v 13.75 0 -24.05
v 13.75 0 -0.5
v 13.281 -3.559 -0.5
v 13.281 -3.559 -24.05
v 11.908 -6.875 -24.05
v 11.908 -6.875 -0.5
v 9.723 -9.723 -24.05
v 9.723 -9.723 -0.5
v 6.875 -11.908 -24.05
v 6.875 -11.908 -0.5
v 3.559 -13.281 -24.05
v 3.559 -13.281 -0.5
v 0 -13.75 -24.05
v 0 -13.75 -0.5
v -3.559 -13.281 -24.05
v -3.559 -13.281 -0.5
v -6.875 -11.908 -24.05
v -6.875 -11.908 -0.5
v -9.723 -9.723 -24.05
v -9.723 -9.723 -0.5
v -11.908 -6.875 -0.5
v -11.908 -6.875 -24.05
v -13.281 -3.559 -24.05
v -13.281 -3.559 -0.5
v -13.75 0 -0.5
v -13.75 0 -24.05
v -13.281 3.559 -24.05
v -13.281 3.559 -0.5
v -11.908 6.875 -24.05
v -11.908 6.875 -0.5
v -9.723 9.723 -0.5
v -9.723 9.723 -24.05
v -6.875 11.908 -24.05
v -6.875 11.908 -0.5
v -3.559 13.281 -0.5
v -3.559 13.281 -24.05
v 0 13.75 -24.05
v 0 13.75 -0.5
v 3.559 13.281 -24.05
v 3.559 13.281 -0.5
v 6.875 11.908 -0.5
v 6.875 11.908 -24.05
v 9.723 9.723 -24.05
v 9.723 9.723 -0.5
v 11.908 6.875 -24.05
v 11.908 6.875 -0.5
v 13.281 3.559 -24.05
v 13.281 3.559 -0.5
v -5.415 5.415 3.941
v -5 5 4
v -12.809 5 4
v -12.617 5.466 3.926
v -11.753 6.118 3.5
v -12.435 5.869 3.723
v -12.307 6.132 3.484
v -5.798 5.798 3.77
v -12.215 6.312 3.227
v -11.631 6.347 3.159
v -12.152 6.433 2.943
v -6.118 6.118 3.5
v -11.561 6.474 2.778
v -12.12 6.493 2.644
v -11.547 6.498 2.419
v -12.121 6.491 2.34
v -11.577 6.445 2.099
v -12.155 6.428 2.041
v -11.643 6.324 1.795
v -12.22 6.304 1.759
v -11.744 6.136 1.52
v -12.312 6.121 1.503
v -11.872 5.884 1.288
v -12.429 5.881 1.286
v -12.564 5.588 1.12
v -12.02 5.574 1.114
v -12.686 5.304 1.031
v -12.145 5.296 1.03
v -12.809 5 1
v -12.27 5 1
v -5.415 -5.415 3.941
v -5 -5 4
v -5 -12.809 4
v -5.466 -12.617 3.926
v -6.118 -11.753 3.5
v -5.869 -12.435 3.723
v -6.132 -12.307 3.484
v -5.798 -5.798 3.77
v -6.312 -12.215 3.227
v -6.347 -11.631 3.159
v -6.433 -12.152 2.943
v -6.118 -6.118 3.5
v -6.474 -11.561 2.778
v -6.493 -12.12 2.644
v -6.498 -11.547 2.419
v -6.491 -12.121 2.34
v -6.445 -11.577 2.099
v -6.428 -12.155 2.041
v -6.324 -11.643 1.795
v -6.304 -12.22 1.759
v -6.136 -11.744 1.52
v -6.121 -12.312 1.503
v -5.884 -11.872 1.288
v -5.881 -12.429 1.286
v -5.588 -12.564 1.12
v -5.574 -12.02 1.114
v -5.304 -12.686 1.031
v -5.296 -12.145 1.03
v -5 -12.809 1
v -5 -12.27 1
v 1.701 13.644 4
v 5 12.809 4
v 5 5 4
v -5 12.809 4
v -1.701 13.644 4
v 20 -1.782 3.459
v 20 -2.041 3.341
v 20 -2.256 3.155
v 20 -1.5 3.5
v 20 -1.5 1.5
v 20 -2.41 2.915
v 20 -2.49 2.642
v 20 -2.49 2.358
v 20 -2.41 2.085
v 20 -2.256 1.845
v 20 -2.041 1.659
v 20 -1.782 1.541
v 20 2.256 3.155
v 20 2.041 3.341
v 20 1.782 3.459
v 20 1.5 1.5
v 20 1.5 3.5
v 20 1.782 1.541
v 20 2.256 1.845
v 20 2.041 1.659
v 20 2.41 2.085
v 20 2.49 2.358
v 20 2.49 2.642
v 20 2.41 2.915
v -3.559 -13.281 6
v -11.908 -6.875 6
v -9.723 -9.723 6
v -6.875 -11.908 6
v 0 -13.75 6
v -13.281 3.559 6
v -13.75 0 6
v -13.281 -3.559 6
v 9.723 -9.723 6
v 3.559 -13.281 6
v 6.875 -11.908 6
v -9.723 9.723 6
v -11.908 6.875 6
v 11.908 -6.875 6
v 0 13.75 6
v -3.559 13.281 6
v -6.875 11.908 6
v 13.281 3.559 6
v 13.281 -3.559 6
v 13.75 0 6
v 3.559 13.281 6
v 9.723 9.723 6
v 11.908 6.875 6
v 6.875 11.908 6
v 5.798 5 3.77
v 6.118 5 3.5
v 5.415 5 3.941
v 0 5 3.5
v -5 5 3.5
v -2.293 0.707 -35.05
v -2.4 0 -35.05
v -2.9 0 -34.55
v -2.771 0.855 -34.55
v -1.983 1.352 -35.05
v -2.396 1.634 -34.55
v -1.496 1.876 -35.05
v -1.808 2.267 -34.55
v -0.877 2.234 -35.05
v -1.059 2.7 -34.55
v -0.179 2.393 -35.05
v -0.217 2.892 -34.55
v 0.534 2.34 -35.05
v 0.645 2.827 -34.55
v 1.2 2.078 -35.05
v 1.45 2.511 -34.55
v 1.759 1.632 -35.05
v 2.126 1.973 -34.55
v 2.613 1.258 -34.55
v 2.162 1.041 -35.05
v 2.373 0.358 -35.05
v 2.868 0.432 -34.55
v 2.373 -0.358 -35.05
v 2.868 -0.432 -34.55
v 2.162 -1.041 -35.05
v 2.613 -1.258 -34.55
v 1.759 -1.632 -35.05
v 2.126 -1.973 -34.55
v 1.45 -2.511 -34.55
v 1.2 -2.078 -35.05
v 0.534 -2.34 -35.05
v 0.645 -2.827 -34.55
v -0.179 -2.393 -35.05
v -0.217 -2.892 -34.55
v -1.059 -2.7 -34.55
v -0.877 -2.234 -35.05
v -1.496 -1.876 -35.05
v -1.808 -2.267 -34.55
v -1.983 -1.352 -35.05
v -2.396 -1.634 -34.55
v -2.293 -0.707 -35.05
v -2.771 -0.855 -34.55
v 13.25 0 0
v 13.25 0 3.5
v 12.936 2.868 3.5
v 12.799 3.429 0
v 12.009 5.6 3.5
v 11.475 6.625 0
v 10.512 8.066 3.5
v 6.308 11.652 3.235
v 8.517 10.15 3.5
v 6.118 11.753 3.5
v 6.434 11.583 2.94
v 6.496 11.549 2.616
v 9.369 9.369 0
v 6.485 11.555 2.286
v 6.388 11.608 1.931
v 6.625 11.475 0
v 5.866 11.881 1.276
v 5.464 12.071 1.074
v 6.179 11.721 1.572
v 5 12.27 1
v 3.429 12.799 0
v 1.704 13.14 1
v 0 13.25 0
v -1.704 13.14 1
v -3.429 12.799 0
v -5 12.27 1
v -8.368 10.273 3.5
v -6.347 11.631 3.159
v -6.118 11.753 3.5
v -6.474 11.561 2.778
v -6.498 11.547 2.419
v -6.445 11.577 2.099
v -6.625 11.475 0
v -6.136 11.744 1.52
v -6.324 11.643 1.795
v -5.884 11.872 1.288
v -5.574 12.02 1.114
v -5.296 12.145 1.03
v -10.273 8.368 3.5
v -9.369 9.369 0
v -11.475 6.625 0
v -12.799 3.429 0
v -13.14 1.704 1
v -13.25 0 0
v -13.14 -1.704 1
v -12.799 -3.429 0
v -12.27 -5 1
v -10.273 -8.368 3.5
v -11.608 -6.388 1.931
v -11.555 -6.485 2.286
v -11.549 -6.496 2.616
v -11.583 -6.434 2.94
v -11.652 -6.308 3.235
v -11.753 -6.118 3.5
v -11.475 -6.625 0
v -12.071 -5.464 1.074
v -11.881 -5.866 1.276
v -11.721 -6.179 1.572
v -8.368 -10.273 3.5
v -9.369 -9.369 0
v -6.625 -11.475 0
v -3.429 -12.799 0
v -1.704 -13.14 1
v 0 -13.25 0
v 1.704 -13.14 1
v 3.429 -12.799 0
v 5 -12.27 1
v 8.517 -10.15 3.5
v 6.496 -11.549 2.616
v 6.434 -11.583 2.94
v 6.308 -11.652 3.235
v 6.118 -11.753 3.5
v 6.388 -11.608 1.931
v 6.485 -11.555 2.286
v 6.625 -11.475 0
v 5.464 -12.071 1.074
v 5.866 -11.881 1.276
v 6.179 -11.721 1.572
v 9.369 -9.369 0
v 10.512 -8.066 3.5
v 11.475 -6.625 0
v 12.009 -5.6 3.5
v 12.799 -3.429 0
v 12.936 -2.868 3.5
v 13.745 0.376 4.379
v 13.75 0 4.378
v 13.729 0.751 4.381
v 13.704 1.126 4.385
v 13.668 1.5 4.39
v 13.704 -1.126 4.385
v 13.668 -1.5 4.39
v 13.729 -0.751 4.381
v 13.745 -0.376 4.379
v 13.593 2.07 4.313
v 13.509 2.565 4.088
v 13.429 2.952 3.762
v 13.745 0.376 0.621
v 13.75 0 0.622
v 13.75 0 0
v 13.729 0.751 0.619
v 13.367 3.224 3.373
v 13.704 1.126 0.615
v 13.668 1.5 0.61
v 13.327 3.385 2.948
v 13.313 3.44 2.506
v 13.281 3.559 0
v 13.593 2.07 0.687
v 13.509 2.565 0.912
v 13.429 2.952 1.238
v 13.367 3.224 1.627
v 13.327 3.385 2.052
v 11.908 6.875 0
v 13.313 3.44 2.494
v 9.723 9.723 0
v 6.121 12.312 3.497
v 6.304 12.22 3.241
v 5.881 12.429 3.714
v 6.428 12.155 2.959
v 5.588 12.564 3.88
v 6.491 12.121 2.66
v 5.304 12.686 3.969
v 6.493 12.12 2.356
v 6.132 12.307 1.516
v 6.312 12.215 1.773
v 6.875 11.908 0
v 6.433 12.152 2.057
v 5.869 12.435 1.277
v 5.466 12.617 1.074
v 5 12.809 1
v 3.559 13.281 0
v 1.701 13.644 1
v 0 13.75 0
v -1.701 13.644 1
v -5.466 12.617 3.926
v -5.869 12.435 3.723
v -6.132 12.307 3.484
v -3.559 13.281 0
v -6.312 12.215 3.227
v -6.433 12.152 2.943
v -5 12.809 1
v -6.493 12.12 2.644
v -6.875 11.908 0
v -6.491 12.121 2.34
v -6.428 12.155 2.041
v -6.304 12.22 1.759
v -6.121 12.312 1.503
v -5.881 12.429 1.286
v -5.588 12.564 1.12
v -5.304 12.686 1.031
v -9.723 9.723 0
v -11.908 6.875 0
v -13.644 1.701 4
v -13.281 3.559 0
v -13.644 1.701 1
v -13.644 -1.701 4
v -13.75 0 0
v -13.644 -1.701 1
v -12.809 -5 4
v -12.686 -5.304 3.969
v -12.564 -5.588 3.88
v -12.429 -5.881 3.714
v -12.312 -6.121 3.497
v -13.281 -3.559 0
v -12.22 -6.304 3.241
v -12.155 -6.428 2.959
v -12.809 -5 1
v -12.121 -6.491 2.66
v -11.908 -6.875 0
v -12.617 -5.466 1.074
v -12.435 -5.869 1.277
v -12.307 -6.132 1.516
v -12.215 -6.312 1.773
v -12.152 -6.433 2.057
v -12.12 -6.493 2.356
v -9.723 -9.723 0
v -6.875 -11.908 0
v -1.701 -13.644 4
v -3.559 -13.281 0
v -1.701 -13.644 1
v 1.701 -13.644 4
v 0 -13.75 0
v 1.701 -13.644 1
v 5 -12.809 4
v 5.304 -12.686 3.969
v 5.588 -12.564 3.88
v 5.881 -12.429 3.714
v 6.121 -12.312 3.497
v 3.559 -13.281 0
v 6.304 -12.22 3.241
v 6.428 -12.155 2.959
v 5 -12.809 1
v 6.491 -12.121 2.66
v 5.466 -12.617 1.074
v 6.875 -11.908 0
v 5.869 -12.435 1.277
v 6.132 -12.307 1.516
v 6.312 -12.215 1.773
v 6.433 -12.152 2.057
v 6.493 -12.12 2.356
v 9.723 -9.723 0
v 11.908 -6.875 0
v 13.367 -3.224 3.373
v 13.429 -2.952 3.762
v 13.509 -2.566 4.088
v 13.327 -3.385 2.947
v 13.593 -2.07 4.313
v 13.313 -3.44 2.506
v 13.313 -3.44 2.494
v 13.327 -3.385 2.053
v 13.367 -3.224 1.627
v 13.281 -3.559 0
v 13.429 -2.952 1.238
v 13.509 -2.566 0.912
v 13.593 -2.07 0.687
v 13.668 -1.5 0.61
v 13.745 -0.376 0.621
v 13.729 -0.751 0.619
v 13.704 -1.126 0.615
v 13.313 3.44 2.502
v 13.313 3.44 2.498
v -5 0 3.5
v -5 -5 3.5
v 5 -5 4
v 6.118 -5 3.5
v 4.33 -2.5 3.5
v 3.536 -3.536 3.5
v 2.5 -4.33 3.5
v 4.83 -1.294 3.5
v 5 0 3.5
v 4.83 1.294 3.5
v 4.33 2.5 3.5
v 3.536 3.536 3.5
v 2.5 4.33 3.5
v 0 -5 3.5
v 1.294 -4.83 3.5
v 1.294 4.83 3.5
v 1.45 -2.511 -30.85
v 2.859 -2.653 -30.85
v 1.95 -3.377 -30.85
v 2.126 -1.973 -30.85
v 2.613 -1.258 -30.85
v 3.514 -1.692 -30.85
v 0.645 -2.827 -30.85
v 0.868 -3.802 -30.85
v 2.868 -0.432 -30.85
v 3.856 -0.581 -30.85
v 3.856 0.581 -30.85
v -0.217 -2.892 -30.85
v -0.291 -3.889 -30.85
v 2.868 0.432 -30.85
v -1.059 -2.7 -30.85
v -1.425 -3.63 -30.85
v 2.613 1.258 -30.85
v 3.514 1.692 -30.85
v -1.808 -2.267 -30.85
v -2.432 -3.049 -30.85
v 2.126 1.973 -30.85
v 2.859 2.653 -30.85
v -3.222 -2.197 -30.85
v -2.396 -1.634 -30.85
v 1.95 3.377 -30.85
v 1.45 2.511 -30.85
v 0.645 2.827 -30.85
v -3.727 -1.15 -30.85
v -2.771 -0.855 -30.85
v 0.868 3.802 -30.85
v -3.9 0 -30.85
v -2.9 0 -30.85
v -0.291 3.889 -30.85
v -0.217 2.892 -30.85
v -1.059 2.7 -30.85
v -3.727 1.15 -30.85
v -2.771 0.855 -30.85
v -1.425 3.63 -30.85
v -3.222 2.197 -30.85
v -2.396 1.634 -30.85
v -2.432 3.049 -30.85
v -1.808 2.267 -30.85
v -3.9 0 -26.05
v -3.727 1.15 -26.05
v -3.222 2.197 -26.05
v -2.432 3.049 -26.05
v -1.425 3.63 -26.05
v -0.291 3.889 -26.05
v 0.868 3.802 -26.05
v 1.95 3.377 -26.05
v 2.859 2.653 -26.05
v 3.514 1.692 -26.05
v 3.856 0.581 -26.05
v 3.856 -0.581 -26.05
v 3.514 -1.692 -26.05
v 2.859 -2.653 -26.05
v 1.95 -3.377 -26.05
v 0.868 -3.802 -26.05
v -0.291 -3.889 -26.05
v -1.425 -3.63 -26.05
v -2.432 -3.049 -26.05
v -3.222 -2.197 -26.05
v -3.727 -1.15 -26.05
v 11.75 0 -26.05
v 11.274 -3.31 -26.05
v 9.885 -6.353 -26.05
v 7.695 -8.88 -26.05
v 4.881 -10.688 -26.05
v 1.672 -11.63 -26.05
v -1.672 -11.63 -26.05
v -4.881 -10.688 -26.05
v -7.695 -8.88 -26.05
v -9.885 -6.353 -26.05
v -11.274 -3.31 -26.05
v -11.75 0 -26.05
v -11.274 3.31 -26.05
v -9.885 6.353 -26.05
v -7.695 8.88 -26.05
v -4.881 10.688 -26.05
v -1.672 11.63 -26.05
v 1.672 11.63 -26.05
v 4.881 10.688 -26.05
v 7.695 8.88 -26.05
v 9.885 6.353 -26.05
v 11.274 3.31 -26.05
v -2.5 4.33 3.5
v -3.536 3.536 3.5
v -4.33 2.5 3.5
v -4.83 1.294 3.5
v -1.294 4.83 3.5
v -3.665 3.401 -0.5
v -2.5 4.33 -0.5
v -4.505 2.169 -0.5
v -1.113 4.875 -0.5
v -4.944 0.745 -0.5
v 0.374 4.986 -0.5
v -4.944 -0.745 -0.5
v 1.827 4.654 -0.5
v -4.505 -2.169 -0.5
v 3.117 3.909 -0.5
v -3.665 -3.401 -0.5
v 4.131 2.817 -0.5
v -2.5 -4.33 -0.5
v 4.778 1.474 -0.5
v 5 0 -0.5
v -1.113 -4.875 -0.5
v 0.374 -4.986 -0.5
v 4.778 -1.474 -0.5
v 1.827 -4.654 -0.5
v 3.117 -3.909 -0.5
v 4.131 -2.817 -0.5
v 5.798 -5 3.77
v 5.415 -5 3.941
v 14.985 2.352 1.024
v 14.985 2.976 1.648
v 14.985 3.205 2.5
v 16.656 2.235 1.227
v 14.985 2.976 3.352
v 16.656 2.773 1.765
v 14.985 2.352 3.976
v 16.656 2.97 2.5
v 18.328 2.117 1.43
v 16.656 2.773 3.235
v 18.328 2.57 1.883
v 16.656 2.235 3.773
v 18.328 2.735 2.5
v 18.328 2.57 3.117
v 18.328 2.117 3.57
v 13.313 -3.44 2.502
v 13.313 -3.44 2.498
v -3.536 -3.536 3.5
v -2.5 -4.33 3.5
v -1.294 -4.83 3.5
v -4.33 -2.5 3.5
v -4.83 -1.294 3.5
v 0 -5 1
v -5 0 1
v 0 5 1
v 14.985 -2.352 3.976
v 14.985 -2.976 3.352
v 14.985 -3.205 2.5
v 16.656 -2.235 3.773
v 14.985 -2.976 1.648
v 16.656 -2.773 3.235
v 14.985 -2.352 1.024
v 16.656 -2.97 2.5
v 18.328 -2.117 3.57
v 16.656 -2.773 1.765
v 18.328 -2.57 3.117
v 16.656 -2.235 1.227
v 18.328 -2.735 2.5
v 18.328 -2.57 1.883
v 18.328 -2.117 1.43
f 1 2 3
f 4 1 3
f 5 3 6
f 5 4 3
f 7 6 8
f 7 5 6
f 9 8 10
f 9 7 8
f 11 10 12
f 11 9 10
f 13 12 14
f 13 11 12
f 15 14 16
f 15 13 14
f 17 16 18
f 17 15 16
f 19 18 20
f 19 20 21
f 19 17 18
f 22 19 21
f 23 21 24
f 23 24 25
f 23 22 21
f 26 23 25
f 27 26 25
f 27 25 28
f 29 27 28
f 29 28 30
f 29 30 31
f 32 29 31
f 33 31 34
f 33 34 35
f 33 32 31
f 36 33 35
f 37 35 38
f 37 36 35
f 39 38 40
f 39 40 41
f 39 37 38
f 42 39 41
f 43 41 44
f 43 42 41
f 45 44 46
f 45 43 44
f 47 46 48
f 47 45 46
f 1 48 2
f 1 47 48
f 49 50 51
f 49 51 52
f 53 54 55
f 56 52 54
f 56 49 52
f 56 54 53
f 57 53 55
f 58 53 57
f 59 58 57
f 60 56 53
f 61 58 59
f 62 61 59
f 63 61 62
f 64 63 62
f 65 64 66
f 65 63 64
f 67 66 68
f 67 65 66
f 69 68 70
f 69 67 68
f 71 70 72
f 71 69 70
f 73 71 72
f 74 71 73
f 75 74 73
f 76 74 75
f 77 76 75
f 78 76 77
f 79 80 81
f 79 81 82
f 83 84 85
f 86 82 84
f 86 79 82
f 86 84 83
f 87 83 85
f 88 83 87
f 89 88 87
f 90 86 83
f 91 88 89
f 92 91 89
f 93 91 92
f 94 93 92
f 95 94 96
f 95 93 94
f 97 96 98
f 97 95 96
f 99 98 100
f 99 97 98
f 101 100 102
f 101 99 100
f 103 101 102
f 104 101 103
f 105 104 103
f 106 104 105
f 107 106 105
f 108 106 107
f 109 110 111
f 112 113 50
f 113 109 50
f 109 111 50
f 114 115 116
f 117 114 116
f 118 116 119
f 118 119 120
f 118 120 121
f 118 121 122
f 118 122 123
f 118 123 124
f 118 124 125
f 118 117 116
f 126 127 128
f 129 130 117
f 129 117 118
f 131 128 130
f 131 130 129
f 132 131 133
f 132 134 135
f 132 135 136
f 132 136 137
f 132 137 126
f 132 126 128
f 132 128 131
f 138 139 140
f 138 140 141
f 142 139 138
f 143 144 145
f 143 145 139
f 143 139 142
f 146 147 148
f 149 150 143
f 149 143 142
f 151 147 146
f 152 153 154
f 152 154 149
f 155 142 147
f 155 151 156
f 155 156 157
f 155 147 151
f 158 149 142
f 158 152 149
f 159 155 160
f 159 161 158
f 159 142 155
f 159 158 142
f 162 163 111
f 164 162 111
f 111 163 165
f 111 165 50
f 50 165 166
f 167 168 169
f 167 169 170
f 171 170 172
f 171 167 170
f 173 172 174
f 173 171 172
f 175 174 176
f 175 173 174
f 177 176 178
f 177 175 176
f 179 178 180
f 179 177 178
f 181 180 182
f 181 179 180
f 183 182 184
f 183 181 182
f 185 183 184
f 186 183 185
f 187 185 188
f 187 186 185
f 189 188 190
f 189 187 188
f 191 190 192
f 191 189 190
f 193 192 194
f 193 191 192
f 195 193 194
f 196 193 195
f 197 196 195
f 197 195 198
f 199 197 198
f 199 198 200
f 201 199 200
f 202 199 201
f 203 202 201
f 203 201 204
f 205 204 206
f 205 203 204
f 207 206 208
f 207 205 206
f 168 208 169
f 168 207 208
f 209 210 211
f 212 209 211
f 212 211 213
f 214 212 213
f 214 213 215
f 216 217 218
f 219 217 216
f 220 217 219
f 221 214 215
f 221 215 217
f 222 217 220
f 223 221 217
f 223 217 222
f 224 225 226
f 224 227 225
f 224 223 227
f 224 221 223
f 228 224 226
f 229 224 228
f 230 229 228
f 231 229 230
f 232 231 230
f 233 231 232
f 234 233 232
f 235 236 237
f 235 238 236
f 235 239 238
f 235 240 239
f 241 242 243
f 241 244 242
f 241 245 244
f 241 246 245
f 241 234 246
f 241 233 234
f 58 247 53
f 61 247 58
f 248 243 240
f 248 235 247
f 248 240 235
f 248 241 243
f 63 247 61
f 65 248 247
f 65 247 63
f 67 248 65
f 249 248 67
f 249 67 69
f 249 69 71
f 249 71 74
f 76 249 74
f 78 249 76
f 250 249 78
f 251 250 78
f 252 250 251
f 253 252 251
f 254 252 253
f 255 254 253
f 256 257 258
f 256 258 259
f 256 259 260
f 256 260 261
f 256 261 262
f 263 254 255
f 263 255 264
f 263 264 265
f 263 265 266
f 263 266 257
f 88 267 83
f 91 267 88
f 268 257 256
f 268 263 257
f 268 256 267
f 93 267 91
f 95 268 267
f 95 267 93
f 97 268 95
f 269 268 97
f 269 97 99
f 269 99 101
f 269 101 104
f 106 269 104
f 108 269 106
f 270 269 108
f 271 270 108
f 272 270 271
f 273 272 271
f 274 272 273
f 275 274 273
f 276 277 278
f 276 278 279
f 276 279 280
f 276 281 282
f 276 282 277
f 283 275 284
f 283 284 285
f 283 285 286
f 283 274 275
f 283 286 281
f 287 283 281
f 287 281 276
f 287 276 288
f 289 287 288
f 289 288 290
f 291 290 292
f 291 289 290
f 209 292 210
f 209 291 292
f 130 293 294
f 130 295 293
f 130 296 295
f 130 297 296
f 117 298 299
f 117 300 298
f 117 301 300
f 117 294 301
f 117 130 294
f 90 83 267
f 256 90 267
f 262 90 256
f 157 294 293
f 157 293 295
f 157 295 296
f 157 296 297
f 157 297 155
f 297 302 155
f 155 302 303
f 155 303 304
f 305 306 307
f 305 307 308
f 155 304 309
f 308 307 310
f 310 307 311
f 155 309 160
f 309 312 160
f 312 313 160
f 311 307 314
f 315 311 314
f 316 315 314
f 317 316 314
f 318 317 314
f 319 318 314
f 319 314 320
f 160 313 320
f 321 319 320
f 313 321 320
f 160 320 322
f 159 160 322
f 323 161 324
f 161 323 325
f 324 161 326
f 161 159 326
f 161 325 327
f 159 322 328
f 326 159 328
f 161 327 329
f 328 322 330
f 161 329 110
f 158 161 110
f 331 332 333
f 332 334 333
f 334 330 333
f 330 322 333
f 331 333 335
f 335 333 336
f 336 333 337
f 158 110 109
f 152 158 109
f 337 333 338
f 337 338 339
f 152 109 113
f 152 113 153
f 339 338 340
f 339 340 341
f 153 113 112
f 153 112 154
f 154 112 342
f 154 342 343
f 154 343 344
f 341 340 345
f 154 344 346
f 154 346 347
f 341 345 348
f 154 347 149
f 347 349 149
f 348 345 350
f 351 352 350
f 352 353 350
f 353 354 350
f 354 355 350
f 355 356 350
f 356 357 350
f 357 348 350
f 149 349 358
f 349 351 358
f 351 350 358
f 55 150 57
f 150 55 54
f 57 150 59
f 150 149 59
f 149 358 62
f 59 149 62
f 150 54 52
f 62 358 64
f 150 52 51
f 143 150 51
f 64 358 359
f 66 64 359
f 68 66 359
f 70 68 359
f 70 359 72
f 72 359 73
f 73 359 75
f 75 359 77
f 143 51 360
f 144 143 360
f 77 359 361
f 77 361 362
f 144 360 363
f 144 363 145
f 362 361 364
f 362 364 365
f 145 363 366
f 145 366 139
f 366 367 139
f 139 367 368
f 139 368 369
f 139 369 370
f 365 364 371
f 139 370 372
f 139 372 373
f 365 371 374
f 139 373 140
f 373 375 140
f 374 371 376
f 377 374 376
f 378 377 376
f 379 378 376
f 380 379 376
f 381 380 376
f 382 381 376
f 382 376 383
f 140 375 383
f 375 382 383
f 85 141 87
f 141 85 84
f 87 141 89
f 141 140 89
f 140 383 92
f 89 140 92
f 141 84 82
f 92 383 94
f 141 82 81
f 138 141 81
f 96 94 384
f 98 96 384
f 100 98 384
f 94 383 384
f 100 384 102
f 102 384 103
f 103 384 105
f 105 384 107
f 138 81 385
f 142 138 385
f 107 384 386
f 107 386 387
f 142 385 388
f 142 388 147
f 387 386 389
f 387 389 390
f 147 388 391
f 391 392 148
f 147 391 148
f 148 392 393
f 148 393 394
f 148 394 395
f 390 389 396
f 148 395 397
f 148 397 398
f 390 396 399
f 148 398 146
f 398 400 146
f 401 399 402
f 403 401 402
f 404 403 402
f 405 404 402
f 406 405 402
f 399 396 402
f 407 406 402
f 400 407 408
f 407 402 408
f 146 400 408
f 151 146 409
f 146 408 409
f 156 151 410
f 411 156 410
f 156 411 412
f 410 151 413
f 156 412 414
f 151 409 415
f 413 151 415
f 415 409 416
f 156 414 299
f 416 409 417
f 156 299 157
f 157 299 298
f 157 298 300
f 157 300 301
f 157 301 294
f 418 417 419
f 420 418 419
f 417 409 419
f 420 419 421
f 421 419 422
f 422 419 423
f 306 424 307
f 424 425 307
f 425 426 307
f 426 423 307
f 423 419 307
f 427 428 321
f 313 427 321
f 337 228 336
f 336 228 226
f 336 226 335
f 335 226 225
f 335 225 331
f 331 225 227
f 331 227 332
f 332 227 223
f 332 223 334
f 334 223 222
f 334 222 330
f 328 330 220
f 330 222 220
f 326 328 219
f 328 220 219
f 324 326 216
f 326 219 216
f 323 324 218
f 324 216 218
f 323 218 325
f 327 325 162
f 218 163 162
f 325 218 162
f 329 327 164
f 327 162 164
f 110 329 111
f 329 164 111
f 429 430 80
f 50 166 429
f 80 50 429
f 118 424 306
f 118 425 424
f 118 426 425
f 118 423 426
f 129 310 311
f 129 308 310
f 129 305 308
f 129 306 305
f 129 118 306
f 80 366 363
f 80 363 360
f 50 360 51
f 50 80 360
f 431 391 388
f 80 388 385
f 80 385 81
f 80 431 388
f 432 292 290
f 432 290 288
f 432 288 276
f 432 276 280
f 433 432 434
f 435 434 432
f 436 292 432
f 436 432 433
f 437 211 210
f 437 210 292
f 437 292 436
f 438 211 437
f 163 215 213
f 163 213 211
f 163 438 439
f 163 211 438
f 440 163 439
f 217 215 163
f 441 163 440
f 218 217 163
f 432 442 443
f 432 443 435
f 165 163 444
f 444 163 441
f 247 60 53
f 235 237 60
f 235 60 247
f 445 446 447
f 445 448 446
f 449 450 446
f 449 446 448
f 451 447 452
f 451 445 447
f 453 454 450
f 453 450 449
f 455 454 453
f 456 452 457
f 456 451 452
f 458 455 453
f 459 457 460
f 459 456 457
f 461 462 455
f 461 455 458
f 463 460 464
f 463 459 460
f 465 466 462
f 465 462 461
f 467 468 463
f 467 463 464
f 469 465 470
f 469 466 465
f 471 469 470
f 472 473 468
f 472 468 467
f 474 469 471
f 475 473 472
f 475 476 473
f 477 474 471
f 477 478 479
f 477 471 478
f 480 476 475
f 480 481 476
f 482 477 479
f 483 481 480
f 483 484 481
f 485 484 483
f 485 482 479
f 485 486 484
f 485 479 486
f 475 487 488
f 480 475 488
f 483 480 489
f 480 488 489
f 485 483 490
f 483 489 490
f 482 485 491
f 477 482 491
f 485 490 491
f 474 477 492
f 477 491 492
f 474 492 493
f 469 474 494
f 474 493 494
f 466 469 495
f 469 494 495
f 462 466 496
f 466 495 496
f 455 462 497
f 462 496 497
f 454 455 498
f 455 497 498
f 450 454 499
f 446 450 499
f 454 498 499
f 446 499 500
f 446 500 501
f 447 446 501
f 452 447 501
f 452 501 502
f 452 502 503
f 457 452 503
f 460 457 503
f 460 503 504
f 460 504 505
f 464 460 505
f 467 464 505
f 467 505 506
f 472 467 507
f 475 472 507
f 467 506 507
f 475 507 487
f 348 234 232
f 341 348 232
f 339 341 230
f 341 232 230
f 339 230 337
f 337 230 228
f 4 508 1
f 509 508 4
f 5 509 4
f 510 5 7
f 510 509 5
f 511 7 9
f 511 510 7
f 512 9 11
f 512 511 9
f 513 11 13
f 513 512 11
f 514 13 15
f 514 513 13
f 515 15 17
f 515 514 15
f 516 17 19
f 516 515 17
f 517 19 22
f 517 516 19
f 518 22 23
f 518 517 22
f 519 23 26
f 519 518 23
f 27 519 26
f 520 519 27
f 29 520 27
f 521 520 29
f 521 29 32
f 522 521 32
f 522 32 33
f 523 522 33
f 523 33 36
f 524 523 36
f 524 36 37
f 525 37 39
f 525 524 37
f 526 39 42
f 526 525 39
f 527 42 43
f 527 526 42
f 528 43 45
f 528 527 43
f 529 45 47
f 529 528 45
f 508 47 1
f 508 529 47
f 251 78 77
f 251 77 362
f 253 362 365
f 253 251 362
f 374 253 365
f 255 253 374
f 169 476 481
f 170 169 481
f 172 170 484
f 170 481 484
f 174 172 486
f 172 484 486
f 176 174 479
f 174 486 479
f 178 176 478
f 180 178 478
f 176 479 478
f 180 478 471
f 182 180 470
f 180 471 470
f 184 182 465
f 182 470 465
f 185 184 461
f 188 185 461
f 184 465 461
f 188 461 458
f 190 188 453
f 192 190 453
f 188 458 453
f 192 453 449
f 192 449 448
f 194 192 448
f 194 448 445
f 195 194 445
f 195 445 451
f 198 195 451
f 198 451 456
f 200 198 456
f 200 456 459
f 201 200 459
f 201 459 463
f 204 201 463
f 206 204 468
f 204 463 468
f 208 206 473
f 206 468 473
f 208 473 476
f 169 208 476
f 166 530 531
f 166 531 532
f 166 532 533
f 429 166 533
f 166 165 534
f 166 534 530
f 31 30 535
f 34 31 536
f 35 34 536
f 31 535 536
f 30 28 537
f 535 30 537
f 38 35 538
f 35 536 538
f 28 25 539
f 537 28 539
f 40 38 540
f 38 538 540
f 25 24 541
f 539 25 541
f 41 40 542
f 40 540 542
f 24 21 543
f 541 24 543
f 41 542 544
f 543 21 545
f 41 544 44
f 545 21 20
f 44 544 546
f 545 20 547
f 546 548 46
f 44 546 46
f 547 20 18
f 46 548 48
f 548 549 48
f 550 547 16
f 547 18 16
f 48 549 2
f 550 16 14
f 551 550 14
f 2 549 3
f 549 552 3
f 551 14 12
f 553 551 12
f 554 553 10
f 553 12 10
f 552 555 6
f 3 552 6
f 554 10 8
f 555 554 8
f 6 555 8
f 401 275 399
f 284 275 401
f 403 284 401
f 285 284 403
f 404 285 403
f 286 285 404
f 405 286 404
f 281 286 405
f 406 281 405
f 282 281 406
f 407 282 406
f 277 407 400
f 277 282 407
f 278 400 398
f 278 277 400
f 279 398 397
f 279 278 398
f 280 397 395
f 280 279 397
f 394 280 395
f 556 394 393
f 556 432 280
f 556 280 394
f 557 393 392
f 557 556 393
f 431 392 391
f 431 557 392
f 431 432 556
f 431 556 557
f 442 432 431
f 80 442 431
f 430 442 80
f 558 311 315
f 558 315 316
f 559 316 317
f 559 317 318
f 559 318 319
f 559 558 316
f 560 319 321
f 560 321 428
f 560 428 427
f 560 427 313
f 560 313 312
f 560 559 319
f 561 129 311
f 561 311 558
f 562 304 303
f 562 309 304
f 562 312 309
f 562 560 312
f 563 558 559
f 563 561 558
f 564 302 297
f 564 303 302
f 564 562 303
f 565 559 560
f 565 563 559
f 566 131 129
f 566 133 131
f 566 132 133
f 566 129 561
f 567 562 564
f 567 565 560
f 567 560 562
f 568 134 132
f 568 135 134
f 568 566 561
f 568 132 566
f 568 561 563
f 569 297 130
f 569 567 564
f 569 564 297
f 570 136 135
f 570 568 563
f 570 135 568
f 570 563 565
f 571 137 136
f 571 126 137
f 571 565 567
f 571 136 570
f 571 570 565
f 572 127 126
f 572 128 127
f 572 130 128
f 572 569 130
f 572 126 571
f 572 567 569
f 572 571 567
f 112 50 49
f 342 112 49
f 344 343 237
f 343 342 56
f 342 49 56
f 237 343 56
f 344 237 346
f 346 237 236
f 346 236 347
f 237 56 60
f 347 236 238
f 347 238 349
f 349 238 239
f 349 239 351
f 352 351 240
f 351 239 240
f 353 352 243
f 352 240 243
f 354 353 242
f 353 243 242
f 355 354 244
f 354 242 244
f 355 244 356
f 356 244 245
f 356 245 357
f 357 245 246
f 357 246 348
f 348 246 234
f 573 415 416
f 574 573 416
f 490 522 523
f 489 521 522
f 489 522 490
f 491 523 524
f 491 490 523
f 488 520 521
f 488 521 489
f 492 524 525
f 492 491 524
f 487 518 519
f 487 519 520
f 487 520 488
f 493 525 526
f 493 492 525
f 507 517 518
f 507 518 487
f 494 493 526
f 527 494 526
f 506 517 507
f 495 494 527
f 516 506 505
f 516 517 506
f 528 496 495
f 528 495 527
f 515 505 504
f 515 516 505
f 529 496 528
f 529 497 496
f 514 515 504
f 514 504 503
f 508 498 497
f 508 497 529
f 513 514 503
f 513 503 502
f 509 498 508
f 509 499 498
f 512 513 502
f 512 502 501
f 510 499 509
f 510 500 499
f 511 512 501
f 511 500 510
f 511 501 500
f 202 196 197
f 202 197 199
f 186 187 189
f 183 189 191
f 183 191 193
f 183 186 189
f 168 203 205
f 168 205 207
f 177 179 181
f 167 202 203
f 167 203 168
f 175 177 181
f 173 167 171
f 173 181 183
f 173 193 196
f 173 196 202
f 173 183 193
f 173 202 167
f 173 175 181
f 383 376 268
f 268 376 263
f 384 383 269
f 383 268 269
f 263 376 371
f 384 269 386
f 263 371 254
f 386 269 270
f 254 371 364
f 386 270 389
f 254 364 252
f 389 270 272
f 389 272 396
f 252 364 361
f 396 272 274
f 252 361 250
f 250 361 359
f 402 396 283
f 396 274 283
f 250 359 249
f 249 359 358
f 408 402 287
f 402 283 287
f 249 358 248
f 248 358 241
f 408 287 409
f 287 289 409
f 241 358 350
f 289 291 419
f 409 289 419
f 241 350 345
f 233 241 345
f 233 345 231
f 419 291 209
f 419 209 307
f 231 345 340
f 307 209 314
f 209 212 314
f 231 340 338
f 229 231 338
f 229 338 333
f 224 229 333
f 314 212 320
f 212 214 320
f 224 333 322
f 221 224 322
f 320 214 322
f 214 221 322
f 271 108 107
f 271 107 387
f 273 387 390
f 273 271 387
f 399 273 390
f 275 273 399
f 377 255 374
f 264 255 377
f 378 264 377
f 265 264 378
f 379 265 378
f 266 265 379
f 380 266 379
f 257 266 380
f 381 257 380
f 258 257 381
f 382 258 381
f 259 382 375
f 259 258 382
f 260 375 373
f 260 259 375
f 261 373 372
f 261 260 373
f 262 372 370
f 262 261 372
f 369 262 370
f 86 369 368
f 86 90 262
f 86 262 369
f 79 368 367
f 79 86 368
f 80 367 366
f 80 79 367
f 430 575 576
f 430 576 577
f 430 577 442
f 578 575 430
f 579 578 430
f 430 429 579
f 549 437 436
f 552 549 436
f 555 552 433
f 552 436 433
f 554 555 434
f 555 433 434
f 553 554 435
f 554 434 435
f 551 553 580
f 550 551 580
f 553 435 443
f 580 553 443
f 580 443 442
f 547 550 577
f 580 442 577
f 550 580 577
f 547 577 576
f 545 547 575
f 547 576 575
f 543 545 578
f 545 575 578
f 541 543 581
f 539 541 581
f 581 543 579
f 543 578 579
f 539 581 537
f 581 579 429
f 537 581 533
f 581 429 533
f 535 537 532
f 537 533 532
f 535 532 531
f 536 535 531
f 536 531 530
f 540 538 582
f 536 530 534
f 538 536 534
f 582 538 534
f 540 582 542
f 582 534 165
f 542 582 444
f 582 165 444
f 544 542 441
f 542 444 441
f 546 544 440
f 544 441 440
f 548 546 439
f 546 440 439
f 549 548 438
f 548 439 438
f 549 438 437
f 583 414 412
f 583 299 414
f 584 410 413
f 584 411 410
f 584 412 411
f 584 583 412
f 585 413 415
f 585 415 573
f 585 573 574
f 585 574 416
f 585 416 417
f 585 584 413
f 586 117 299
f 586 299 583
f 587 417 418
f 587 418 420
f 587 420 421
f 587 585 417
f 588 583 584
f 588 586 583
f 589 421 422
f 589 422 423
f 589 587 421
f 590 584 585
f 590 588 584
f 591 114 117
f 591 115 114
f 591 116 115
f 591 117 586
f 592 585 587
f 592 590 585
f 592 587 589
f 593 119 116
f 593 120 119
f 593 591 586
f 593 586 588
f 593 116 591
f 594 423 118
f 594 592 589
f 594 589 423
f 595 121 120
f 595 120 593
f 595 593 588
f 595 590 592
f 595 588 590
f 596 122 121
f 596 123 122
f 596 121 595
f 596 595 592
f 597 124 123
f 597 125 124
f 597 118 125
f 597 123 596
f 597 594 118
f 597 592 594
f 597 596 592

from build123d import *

# Parameters (mm, degrees)
SKETCH1_R           = 13.75
BOSS_EXTRUDE1_DEPTH = 6
SHELL1_T            = -0.5
SKETCH3_R           = 5
BOSS_EXTRUDE2_DEPTH = 6
BOSS_EXTRUDE7_START = 2
SKETCH10_R          = 13.25
BOSS_EXTRUDE7_DEPTH = 2
BOSS_EXTRUDE3_START = 25.55
SKETCH4_R           = 13.75
BOSS_EXTRUDE3_DEPTH = 25.55
CHAMFER1_SIZE       = 2
SKETCH5_R           = 3.9
BOSS_EXTRUDE4_DEPTH = 4.8
SKETCH6_R           = 2.9
BOSS_EXTRUDE5_DEPTH = 4.2
CHAMFER2_SIZE       = 0.5
CUT_EXTRUDE1_START  = -5
CUT_EXTRUDE1_DEPTH  = 24.2
CUT_EXTRUDE2_START  = -5
CUT_EXTRUDE2_DEPTH  = 24.2
BOSS_EXTRUDE8_DEPTH = 6.687218579
BOSS_EXTRUDE8_DRAFT = 8


# Read off the part's stored shape, not the designer's step: Boss-Extrude8
with BuildPart() as part:
    # Sketch1 → Boss-Extrude1 (new body)
    with BuildSketch(Plane.XY):
        Circle(SKETCH1_R)
    extrude(amount=BOSS_EXTRUDE1_DEPTH)

    # Shell1
    shell1_openings = [part.faces().sort_by_distance(p)[0] for p in [
        (0, 0, 0),
    ]]
    offset(amount=SHELL1_T, openings=shell1_openings, kind=Kind.INTERSECTION)

    # Sketch3 → Boss-Extrude2 (add)
    with BuildSketch(Plane(origin=(0, 0, 5.5), x_dir=(-1, 0, 0), z_dir=(0, 0, -1))):
        with Locations(Location((0, 0, 0), (0, 0, 180))):
            Circle(SKETCH3_R)
    extrude(amount=BOSS_EXTRUDE2_DEPTH)

    # Sketch10 → Boss-Extrude7 (add)
    with BuildSketch(Plane(origin=(0, 0, 5.5), x_dir=(-1, 0, 0), z_dir=(0, 0, -1)).offset(BOSS_EXTRUDE7_START)):
        Circle(SKETCH10_R)
    extrude(amount=-BOSS_EXTRUDE7_DEPTH)

    # Sketch4 → Boss-Extrude3 (add)
    with BuildSketch(Plane(origin=(0, 0, -0.5), x_dir=(-1, 0, 0), z_dir=(0, 0, -1)).offset(BOSS_EXTRUDE3_START)):
        with Locations(Location((0, 0, 0), (0, 0, 180))):
            Circle(SKETCH4_R)
    extrude(amount=-BOSS_EXTRUDE3_DEPTH)

    # Chamfer1
    chamfer1_edges = [part.edges().sort_by_distance(p)[0] for p in [
        (-13.75, 0, -26.05),
    ]]
    chamfer(chamfer1_edges, length=CHAMFER1_SIZE)

    # Sketch5 → Boss-Extrude4 (add)
    with BuildSketch(Plane(origin=(0, 0, -26.05), x_dir=(-1, 0, 0), z_dir=(0, 0, -1))):
        Circle(SKETCH5_R)
    extrude(amount=BOSS_EXTRUDE4_DEPTH)

    # Sketch6 → Boss-Extrude5 (add)
    with BuildSketch(Plane(origin=(0, 0, -30.85), x_dir=(-1, 0, 0), z_dir=(0, 0, -1))):
        Circle(SKETCH6_R)
    extrude(amount=BOSS_EXTRUDE5_DEPTH)

    # Chamfer2
    chamfer2_edges = [part.edges().sort_by_distance(p)[0] for p in [
        (2.9, 0, -35.05),
    ]]
    chamfer(chamfer2_edges, length=CHAMFER2_SIZE)

    # Sketch7 → Cut-Extrude1 (cut)
    with BuildSketch(Plane(origin=(0, 0, 0), x_dir=(0, 0, -1), z_dir=(1, 0, 0)).offset(CUT_EXTRUDE1_START)):
        with BuildLine():
            Line((-4, -5), (-4, 5))
            ThreePointArc((-4, 5), (-2.5, 6.5), (-1, 5))
            Line((-1, 5), (-1, -5))
            ThreePointArc((-1, -5), (-2.5, -6.5), (-4, -5))
        make_face()
    extrude(amount=-CUT_EXTRUDE1_DEPTH, mode=Mode.SUBTRACT)

    # Sketch8 → Cut-Extrude2 (cut)
    with BuildSketch(Plane(origin=(0, 0, 0), x_dir=(1, 0, 0), z_dir=(0, 1, 0)).offset(CUT_EXTRUDE2_START)):
        with BuildLine():
            Line((-5, -1), (5, -1))
            ThreePointArc((5, -1), (6.5, -2.5), (5, -4))
            Line((5, -4), (-5, -4))
            ThreePointArc((-5, -4), (-6.5, -2.5), (-5, -1))
        make_face()
    cut_extrude2 = extrude(amount=-CUT_EXTRUDE2_DEPTH, mode=Mode.SUBTRACT)

    # Mirror1: Cut-Extrude2 across plane
    add(cut_extrude2.mirror(Plane.ZX), mode=Mode.SUBTRACT)


with BuildPart() as boss_extrude8_tool:
    # Boss-Extrude8 outline → Boss-Extrude8 (with draft: the straight prism first)
    with BuildSketch(Plane(origin=(20, 0, 0), x_dir=(0, 0, -1), z_dir=(1, 0, 0))):
        with BuildLine():
            ThreePointArc((-3.5, -1.5), (-2.5, -2.5), (-1.5, -1.5))
            Line((-1.5, -1.5), (-1.5, 1.5))
            ThreePointArc((-1.5, 1.5), (-2.5, 2.5), (-3.5, 1.5))
            Line((-3.5, 1.5), (-3.5, -1.5))
        make_face()
    extrude(amount=-BOSS_EXTRUDE8_DEPTH)
    # Boss-Extrude8: the draft: its side faces are tilted about the plane it starts from
    boss_extrude8_sides = [boss_extrude8_tool.faces().sort_by_distance(p)[0] for p in [
        (16.656390711, 0, 3.5),
        (16.65639071, -2.5, 2.5),
        (16.656390711, 0, 1.5),
        (16.65639071, 2.5, 2.5),
    ]]
    draft(boss_extrude8_sides, Plane(origin=(20, 0, 0), x_dir=(0, 0, -1), z_dir=(1, 0, 0)), BOSS_EXTRUDE8_DRAFT)


with BuildPart() as part_1:
    add(part.part)

    # Boss-Extrude8: add boss_extrude8_tool
    add(boss_extrude8_tool.part)


solid = part_1.part
